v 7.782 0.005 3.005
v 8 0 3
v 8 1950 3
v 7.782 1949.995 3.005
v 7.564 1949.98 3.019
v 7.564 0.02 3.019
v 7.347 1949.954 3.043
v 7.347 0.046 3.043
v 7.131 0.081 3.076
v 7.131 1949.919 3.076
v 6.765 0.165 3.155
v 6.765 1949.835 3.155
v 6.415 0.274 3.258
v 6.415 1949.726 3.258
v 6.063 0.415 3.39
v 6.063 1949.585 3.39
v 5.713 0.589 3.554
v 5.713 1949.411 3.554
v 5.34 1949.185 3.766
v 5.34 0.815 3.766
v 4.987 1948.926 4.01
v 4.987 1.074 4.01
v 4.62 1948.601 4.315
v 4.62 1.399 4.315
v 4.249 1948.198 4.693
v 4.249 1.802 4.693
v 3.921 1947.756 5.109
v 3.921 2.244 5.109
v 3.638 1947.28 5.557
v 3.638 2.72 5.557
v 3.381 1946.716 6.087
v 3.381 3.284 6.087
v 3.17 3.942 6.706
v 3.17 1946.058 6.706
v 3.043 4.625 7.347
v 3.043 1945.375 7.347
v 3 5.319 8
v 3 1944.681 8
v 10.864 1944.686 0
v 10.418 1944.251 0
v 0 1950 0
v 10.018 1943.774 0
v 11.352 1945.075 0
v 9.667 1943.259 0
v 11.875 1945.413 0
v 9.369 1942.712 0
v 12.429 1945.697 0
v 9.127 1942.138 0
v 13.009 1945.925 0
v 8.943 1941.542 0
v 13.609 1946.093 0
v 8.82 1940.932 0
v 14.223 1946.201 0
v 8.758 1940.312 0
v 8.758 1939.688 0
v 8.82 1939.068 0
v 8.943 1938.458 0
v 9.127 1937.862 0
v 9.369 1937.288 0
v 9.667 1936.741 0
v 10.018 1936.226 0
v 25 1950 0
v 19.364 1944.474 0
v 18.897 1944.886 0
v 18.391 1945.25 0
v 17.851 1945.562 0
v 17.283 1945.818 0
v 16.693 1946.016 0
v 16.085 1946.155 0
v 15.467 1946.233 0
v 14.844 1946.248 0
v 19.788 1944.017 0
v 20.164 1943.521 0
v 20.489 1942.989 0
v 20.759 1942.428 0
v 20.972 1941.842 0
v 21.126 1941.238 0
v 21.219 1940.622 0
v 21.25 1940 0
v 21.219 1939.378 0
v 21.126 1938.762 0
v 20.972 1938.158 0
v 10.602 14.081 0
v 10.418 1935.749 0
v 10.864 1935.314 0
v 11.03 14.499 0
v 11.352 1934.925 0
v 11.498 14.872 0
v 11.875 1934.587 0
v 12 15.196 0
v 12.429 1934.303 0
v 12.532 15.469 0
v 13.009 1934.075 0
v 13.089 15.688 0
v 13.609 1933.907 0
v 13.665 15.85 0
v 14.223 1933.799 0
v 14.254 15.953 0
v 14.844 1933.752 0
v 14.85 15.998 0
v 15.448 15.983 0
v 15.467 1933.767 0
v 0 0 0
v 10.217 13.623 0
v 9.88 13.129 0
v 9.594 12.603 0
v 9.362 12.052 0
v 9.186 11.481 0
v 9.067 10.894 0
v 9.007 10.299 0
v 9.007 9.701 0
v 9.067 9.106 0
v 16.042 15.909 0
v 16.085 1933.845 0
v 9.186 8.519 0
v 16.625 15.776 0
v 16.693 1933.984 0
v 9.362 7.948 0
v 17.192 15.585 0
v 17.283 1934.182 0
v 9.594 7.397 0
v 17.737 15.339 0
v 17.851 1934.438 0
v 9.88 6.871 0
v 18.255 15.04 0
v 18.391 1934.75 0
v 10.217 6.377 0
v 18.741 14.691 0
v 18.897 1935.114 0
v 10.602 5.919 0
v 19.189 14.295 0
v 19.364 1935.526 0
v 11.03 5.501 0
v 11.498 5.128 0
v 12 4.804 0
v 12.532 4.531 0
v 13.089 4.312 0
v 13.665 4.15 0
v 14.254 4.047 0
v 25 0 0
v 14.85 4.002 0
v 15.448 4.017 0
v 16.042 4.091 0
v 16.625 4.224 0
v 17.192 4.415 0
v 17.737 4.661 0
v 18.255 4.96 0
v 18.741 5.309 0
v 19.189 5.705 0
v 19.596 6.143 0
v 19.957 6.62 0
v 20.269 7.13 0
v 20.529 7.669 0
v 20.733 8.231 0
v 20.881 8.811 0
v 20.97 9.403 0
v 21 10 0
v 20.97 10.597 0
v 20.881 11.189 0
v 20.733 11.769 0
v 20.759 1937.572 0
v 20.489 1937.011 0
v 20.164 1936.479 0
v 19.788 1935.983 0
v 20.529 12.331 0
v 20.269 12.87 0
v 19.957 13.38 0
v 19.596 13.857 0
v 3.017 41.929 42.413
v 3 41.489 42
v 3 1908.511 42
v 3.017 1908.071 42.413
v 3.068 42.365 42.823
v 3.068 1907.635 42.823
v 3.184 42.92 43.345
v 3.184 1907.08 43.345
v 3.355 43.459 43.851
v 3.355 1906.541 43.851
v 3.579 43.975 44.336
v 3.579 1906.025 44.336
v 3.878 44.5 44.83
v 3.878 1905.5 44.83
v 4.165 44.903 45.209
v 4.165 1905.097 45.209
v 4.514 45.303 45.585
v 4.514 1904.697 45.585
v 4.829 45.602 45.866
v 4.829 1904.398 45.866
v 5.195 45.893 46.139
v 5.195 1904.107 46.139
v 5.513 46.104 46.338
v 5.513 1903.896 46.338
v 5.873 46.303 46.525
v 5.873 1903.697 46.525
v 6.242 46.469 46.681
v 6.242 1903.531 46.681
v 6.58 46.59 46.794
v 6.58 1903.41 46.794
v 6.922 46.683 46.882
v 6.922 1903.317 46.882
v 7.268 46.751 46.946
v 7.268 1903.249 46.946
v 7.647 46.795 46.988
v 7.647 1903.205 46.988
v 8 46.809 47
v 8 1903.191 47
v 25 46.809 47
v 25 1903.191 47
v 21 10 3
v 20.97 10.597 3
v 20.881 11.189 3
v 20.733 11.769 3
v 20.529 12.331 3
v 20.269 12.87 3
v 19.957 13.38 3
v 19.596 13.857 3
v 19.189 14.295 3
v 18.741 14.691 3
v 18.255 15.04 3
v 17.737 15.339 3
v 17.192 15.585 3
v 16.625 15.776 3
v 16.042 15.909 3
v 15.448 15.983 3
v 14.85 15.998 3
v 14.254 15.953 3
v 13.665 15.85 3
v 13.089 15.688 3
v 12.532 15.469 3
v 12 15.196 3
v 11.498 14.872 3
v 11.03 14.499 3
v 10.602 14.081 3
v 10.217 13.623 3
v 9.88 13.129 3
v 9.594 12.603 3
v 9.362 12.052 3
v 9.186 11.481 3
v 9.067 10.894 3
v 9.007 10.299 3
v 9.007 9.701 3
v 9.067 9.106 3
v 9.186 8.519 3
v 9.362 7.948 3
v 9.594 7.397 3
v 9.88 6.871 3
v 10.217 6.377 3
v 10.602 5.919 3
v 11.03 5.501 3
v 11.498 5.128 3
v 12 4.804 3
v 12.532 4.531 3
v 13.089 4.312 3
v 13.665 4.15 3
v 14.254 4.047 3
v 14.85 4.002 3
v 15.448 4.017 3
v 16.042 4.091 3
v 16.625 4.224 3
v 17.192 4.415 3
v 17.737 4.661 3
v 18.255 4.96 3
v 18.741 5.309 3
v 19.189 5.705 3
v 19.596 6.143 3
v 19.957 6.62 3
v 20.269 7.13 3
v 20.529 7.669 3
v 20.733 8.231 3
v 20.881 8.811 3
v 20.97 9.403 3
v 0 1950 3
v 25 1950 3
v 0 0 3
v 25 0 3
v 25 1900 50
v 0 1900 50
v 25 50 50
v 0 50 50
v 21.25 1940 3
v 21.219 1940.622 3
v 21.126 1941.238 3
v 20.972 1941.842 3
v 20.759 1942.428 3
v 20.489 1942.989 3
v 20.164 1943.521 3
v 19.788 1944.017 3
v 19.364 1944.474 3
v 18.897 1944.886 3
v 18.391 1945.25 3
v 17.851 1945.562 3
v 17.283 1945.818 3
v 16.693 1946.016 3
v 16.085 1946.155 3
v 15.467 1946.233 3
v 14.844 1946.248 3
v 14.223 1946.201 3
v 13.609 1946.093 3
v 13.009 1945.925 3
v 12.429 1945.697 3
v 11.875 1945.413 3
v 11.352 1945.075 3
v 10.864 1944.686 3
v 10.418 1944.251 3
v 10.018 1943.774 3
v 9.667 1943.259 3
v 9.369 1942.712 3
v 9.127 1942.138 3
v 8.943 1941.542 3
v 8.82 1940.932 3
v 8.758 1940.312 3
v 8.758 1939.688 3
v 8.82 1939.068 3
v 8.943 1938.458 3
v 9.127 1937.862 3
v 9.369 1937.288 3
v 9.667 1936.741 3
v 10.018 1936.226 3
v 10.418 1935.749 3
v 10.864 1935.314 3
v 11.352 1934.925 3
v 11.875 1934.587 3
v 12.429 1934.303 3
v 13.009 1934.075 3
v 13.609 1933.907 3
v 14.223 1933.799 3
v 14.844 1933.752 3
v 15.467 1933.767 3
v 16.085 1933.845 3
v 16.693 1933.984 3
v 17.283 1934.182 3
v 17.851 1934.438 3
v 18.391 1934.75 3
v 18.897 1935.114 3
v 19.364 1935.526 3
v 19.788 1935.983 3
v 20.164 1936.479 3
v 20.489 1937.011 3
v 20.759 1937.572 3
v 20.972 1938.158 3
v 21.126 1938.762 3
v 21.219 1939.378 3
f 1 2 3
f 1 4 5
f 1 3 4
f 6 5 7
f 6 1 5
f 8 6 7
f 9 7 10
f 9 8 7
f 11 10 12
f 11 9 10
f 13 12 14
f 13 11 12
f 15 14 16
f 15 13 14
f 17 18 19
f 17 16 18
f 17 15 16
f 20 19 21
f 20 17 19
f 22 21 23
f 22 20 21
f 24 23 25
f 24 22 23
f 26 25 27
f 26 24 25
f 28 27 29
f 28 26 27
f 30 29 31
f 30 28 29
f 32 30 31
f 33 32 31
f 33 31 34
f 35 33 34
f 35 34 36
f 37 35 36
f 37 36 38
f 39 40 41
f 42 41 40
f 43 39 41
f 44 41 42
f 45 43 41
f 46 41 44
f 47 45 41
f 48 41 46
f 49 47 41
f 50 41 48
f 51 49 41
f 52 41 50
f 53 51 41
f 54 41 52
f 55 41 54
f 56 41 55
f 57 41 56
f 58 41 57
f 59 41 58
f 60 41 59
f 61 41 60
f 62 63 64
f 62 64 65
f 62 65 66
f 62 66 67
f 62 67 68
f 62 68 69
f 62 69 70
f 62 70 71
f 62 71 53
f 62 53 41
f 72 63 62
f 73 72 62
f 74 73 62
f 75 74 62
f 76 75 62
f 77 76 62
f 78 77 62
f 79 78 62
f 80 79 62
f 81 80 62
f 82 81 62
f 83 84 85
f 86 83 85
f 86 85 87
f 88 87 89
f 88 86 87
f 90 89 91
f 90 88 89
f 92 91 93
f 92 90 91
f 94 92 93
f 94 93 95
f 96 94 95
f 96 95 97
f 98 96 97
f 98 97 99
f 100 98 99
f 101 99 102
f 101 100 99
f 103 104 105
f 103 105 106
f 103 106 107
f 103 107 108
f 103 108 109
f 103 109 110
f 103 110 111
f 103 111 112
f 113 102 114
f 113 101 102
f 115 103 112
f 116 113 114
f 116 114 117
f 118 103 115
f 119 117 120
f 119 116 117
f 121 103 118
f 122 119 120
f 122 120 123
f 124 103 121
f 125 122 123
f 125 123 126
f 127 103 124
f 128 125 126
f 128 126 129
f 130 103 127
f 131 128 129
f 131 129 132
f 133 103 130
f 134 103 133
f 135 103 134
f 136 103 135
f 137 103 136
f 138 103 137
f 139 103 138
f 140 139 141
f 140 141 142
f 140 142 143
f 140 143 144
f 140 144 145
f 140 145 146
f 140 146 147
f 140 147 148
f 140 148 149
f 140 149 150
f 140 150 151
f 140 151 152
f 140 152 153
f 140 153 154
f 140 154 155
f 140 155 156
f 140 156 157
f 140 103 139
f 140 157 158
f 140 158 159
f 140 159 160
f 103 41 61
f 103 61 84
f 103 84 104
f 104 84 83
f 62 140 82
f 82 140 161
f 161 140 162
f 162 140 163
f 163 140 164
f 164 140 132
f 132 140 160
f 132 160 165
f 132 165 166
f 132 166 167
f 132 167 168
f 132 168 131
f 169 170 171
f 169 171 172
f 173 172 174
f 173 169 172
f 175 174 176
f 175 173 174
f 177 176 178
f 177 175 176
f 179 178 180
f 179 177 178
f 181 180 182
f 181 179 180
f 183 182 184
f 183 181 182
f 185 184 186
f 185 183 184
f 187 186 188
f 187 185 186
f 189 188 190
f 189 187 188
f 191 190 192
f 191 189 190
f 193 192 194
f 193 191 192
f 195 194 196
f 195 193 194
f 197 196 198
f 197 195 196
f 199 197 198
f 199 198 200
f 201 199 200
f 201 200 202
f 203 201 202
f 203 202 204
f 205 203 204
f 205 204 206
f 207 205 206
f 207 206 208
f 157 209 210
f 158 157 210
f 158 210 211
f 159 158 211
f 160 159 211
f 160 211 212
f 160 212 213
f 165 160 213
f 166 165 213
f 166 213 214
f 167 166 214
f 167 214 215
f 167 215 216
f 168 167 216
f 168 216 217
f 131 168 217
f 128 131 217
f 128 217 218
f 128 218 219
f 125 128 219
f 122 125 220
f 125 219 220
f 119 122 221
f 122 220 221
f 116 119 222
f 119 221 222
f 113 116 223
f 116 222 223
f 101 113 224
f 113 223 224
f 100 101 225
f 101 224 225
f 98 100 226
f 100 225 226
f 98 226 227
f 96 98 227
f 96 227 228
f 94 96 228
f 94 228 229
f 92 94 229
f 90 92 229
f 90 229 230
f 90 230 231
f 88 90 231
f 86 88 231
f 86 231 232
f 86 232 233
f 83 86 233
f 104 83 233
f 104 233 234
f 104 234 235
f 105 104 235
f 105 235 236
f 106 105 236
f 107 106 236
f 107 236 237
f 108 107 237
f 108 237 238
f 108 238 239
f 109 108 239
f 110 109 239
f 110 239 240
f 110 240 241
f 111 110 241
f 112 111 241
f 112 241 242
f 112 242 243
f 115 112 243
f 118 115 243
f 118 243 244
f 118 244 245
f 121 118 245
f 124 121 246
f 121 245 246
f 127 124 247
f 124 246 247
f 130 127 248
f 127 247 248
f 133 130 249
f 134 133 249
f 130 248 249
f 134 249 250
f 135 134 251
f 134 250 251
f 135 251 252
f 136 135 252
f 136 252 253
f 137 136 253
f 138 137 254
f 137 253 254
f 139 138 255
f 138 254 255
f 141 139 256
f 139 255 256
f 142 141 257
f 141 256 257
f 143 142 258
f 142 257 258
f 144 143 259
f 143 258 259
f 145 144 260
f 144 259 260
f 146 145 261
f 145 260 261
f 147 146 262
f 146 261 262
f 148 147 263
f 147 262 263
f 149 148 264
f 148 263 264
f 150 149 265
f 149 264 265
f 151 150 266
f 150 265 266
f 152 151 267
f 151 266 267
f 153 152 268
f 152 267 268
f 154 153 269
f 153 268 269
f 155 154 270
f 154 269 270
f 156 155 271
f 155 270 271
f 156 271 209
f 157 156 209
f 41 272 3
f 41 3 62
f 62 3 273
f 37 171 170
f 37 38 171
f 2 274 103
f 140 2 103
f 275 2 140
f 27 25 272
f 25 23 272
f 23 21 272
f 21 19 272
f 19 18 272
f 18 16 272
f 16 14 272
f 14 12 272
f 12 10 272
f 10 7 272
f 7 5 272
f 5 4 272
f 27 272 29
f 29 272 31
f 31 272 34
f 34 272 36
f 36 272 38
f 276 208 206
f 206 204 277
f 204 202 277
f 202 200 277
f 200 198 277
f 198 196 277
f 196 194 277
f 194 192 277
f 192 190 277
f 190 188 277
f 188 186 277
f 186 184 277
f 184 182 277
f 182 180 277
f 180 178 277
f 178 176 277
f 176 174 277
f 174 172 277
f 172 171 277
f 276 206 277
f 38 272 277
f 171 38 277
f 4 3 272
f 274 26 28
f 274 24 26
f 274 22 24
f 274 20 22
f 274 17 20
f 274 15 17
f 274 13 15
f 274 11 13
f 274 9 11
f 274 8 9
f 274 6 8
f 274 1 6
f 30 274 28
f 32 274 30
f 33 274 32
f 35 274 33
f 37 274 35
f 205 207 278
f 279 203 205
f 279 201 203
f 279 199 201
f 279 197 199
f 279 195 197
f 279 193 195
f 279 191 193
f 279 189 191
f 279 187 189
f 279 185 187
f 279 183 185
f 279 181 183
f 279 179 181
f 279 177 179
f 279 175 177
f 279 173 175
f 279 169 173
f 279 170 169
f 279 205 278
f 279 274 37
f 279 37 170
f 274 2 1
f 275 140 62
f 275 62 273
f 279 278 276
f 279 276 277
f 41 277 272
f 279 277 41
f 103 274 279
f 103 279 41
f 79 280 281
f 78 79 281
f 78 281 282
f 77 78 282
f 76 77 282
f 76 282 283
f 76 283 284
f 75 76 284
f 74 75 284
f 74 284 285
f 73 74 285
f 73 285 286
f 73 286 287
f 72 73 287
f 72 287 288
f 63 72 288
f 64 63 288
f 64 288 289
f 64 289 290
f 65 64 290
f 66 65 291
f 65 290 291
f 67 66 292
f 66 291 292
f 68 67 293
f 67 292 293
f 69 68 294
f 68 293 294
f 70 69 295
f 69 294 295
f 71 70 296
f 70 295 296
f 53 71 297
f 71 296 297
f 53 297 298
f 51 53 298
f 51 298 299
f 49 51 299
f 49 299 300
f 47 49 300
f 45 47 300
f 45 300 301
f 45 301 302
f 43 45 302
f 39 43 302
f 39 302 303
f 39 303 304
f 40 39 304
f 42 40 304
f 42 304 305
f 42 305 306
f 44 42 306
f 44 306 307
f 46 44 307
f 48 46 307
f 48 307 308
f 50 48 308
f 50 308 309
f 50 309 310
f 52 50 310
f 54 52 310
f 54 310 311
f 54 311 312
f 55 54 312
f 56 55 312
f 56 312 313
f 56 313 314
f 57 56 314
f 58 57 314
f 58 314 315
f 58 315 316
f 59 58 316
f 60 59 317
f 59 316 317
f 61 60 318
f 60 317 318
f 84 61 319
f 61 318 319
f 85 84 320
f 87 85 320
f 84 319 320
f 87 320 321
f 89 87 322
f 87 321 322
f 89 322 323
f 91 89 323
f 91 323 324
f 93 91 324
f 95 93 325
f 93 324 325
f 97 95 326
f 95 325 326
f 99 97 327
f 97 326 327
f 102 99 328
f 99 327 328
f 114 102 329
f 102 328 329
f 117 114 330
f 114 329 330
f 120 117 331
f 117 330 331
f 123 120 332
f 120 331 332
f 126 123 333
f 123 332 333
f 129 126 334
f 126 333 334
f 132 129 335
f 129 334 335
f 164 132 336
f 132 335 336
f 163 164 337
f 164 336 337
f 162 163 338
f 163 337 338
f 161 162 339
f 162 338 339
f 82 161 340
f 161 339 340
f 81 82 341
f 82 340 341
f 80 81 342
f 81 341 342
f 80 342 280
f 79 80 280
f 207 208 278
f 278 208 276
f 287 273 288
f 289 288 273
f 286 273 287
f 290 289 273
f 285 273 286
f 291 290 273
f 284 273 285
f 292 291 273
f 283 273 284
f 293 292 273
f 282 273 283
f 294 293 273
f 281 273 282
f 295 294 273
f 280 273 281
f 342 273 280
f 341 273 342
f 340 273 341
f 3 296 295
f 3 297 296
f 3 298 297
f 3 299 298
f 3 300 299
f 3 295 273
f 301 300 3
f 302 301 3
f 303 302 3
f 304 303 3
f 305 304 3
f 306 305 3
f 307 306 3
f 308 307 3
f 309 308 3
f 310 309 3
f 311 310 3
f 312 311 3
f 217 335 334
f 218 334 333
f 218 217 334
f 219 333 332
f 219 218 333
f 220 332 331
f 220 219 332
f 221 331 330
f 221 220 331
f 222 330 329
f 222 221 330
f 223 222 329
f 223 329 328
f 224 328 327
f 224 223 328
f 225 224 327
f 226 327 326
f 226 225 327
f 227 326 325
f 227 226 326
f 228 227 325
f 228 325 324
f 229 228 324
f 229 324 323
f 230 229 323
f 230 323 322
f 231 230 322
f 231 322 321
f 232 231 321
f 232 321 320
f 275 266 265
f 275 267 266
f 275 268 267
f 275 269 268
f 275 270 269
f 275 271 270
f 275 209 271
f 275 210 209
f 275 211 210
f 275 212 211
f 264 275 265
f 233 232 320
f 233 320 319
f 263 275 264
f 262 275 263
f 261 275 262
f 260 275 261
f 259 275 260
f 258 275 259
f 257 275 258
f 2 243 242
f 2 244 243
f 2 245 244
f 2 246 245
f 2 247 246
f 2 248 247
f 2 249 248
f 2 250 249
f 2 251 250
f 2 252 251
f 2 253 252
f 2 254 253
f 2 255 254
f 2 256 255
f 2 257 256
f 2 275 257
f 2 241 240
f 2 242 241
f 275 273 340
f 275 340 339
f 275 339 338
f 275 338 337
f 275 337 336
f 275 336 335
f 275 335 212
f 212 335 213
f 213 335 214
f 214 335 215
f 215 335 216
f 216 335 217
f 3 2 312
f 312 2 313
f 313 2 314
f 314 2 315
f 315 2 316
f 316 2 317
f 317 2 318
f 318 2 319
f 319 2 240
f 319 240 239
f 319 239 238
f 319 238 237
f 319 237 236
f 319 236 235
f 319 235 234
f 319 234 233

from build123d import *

# Parameters (mm, degrees)
F1_DEPTH = 1950
F3_DEPTH = 25
F5_DEPTH = 25
F6_R     = 6
F7_DEPTH = 3.001
F8_R     = 6.25
F9_DEPTH = 3.001


with BuildPart() as f1:
    # F0 (on Front) → F1 (new body)
    with BuildSketch(Plane.XZ):
        with BuildLine():
            Line((0, 0), (25, 0))
            Line((25, 0), (25, 3))
            Line((25, 3), (8, 3))
            ThreePointArc((8, 3), (4.464466, 4.464466), (3, 8))
            Line((3, 8), (3, 42))
            ThreePointArc((3, 42), (4.464466, 45.535534), (8, 47))
            Line((8, 47), (25, 47))
            Line((25, 47), (25, 50))
            Line((25, 50), (0, 50))
            Line((0, 50), (0, 0))
        make_face()
    extrude(amount=-F1_DEPTH)

    # F2 (on Right) → F3 (cut)
    with BuildSketch(Plane.YZ):
        Polygon((0, 49), (0, 3), (50, 50), (0, 50), align=None)
    extrude(amount=F3_DEPTH, mode=Mode.SUBTRACT)

    # F4 (on face) → F5 (cut)
    with BuildSketch(Plane(origin=(0, 0, 0), x_dir=(0, -1, 0), z_dir=(-1, 0, 0))):
        Polygon((-1950, 3), (-1900, 50), (-1950, 50), align=None)
    extrude(amount=-F5_DEPTH, mode=Mode.SUBTRACT)

    # F6 (on face) → F7 (cut, through all)
    with BuildSketch(Plane.XY.offset(3)):
        with Locations((15, 10)):
            Circle(F6_R)
    extrude(amount=-F7_DEPTH, mode=Mode.SUBTRACT)

    # F8 (on face) → F9 (cut, through all)
    with BuildSketch(Plane.XY.offset(3)):
        with Locations((15, 1940)):
            Circle(F8_R)
    extrude(amount=-F9_DEPTH, mode=Mode.SUBTRACT)


solid = f1.part
